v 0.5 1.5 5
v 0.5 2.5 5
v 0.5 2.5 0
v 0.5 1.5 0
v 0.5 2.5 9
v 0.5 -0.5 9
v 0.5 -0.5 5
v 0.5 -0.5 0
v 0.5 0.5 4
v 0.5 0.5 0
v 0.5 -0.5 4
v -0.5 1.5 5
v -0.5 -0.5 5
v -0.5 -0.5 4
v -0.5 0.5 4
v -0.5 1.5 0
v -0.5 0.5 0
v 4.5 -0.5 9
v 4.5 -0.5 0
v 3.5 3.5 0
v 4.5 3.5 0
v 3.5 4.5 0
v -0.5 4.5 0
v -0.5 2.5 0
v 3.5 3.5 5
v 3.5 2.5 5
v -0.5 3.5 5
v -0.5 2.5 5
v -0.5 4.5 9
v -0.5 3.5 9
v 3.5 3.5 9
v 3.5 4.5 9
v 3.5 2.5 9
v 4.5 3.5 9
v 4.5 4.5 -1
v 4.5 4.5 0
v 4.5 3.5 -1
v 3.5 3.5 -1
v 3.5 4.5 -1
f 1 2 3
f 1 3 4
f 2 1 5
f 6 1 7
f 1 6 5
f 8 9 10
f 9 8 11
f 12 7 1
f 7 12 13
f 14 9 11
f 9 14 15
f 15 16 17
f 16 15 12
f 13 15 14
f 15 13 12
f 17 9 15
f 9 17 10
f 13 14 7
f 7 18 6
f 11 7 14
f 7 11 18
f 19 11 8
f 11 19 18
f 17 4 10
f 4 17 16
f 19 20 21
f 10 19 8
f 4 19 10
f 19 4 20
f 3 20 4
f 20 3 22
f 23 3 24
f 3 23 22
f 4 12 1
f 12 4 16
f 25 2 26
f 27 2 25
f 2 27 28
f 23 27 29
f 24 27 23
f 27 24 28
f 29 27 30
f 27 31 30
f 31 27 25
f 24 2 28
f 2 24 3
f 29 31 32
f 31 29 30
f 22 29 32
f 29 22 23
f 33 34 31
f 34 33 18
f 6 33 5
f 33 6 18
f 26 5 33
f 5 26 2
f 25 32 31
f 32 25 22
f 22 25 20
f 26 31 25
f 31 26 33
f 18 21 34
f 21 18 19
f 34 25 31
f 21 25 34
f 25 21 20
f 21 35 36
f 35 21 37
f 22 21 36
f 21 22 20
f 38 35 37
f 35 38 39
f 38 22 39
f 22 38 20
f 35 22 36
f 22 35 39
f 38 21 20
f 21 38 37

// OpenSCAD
union() {
    translate([0, 0, 4.5]) color([1, 0, 0]) cube([1, 1, 1], center=true);
    translate([0, 1, 2.5]) cube([1, 1, 5], center=true);
    translate([0, 3, 2.5]) cube([1, 1, 5], center=true);
    translate([0, 4, 4.5]) cube([1, 1, 9], center=true);
    translate([1, 0, 4.5]) cube([1, 1, 9], center=true);
    translate([1, 1, 4.5]) cube([1, 1, 9], center=true);
    translate([1, 2, 4.5]) cube([1, 1, 9], center=true);
    translate([1, 3, 2.5]) cube([1, 1, 5], center=true);
    translate([1, 4, 4.5]) cube([1, 1, 9], center=true);
    translate([2, 0, 4.5]) cube([1, 1, 9], center=true);
    translate([2, 1, 4.5]) cube([1, 1, 9], center=true);
    translate([2, 2, 4.5]) cube([1, 1, 9], center=true);
    translate([2, 3, 2.5]) cube([1, 1, 5], center=true);
    translate([2, 4, 4.5]) cube([1, 1, 9], center=true);
    translate([3, 0, 4.5]) cube([1, 1, 9], center=true);
    translate([3, 1, 4.5]) cube([1, 1, 9], center=true);
    translate([3, 2, 4.5]) cube([1, 1, 9], center=true);
    translate([3, 3, 2.5]) cube([1, 1, 5], center=true);
    translate([3, 4, 4.5]) cube([1, 1, 9], center=true);
    translate([4, 0, 4.5]) cube([1, 1, 9], center=true);
    translate([4, 1, 4.5]) cube([1, 1, 9], center=true);
    translate([4, 2, 4.5]) cube([1, 1, 9], center=true);
    translate([4, 3, 4.5]) cube([1, 1, 9], center=true);
    translate([4, 4, -0.5]) color([0, 0, 1]) cube([1, 1, 1], center=true);
}
